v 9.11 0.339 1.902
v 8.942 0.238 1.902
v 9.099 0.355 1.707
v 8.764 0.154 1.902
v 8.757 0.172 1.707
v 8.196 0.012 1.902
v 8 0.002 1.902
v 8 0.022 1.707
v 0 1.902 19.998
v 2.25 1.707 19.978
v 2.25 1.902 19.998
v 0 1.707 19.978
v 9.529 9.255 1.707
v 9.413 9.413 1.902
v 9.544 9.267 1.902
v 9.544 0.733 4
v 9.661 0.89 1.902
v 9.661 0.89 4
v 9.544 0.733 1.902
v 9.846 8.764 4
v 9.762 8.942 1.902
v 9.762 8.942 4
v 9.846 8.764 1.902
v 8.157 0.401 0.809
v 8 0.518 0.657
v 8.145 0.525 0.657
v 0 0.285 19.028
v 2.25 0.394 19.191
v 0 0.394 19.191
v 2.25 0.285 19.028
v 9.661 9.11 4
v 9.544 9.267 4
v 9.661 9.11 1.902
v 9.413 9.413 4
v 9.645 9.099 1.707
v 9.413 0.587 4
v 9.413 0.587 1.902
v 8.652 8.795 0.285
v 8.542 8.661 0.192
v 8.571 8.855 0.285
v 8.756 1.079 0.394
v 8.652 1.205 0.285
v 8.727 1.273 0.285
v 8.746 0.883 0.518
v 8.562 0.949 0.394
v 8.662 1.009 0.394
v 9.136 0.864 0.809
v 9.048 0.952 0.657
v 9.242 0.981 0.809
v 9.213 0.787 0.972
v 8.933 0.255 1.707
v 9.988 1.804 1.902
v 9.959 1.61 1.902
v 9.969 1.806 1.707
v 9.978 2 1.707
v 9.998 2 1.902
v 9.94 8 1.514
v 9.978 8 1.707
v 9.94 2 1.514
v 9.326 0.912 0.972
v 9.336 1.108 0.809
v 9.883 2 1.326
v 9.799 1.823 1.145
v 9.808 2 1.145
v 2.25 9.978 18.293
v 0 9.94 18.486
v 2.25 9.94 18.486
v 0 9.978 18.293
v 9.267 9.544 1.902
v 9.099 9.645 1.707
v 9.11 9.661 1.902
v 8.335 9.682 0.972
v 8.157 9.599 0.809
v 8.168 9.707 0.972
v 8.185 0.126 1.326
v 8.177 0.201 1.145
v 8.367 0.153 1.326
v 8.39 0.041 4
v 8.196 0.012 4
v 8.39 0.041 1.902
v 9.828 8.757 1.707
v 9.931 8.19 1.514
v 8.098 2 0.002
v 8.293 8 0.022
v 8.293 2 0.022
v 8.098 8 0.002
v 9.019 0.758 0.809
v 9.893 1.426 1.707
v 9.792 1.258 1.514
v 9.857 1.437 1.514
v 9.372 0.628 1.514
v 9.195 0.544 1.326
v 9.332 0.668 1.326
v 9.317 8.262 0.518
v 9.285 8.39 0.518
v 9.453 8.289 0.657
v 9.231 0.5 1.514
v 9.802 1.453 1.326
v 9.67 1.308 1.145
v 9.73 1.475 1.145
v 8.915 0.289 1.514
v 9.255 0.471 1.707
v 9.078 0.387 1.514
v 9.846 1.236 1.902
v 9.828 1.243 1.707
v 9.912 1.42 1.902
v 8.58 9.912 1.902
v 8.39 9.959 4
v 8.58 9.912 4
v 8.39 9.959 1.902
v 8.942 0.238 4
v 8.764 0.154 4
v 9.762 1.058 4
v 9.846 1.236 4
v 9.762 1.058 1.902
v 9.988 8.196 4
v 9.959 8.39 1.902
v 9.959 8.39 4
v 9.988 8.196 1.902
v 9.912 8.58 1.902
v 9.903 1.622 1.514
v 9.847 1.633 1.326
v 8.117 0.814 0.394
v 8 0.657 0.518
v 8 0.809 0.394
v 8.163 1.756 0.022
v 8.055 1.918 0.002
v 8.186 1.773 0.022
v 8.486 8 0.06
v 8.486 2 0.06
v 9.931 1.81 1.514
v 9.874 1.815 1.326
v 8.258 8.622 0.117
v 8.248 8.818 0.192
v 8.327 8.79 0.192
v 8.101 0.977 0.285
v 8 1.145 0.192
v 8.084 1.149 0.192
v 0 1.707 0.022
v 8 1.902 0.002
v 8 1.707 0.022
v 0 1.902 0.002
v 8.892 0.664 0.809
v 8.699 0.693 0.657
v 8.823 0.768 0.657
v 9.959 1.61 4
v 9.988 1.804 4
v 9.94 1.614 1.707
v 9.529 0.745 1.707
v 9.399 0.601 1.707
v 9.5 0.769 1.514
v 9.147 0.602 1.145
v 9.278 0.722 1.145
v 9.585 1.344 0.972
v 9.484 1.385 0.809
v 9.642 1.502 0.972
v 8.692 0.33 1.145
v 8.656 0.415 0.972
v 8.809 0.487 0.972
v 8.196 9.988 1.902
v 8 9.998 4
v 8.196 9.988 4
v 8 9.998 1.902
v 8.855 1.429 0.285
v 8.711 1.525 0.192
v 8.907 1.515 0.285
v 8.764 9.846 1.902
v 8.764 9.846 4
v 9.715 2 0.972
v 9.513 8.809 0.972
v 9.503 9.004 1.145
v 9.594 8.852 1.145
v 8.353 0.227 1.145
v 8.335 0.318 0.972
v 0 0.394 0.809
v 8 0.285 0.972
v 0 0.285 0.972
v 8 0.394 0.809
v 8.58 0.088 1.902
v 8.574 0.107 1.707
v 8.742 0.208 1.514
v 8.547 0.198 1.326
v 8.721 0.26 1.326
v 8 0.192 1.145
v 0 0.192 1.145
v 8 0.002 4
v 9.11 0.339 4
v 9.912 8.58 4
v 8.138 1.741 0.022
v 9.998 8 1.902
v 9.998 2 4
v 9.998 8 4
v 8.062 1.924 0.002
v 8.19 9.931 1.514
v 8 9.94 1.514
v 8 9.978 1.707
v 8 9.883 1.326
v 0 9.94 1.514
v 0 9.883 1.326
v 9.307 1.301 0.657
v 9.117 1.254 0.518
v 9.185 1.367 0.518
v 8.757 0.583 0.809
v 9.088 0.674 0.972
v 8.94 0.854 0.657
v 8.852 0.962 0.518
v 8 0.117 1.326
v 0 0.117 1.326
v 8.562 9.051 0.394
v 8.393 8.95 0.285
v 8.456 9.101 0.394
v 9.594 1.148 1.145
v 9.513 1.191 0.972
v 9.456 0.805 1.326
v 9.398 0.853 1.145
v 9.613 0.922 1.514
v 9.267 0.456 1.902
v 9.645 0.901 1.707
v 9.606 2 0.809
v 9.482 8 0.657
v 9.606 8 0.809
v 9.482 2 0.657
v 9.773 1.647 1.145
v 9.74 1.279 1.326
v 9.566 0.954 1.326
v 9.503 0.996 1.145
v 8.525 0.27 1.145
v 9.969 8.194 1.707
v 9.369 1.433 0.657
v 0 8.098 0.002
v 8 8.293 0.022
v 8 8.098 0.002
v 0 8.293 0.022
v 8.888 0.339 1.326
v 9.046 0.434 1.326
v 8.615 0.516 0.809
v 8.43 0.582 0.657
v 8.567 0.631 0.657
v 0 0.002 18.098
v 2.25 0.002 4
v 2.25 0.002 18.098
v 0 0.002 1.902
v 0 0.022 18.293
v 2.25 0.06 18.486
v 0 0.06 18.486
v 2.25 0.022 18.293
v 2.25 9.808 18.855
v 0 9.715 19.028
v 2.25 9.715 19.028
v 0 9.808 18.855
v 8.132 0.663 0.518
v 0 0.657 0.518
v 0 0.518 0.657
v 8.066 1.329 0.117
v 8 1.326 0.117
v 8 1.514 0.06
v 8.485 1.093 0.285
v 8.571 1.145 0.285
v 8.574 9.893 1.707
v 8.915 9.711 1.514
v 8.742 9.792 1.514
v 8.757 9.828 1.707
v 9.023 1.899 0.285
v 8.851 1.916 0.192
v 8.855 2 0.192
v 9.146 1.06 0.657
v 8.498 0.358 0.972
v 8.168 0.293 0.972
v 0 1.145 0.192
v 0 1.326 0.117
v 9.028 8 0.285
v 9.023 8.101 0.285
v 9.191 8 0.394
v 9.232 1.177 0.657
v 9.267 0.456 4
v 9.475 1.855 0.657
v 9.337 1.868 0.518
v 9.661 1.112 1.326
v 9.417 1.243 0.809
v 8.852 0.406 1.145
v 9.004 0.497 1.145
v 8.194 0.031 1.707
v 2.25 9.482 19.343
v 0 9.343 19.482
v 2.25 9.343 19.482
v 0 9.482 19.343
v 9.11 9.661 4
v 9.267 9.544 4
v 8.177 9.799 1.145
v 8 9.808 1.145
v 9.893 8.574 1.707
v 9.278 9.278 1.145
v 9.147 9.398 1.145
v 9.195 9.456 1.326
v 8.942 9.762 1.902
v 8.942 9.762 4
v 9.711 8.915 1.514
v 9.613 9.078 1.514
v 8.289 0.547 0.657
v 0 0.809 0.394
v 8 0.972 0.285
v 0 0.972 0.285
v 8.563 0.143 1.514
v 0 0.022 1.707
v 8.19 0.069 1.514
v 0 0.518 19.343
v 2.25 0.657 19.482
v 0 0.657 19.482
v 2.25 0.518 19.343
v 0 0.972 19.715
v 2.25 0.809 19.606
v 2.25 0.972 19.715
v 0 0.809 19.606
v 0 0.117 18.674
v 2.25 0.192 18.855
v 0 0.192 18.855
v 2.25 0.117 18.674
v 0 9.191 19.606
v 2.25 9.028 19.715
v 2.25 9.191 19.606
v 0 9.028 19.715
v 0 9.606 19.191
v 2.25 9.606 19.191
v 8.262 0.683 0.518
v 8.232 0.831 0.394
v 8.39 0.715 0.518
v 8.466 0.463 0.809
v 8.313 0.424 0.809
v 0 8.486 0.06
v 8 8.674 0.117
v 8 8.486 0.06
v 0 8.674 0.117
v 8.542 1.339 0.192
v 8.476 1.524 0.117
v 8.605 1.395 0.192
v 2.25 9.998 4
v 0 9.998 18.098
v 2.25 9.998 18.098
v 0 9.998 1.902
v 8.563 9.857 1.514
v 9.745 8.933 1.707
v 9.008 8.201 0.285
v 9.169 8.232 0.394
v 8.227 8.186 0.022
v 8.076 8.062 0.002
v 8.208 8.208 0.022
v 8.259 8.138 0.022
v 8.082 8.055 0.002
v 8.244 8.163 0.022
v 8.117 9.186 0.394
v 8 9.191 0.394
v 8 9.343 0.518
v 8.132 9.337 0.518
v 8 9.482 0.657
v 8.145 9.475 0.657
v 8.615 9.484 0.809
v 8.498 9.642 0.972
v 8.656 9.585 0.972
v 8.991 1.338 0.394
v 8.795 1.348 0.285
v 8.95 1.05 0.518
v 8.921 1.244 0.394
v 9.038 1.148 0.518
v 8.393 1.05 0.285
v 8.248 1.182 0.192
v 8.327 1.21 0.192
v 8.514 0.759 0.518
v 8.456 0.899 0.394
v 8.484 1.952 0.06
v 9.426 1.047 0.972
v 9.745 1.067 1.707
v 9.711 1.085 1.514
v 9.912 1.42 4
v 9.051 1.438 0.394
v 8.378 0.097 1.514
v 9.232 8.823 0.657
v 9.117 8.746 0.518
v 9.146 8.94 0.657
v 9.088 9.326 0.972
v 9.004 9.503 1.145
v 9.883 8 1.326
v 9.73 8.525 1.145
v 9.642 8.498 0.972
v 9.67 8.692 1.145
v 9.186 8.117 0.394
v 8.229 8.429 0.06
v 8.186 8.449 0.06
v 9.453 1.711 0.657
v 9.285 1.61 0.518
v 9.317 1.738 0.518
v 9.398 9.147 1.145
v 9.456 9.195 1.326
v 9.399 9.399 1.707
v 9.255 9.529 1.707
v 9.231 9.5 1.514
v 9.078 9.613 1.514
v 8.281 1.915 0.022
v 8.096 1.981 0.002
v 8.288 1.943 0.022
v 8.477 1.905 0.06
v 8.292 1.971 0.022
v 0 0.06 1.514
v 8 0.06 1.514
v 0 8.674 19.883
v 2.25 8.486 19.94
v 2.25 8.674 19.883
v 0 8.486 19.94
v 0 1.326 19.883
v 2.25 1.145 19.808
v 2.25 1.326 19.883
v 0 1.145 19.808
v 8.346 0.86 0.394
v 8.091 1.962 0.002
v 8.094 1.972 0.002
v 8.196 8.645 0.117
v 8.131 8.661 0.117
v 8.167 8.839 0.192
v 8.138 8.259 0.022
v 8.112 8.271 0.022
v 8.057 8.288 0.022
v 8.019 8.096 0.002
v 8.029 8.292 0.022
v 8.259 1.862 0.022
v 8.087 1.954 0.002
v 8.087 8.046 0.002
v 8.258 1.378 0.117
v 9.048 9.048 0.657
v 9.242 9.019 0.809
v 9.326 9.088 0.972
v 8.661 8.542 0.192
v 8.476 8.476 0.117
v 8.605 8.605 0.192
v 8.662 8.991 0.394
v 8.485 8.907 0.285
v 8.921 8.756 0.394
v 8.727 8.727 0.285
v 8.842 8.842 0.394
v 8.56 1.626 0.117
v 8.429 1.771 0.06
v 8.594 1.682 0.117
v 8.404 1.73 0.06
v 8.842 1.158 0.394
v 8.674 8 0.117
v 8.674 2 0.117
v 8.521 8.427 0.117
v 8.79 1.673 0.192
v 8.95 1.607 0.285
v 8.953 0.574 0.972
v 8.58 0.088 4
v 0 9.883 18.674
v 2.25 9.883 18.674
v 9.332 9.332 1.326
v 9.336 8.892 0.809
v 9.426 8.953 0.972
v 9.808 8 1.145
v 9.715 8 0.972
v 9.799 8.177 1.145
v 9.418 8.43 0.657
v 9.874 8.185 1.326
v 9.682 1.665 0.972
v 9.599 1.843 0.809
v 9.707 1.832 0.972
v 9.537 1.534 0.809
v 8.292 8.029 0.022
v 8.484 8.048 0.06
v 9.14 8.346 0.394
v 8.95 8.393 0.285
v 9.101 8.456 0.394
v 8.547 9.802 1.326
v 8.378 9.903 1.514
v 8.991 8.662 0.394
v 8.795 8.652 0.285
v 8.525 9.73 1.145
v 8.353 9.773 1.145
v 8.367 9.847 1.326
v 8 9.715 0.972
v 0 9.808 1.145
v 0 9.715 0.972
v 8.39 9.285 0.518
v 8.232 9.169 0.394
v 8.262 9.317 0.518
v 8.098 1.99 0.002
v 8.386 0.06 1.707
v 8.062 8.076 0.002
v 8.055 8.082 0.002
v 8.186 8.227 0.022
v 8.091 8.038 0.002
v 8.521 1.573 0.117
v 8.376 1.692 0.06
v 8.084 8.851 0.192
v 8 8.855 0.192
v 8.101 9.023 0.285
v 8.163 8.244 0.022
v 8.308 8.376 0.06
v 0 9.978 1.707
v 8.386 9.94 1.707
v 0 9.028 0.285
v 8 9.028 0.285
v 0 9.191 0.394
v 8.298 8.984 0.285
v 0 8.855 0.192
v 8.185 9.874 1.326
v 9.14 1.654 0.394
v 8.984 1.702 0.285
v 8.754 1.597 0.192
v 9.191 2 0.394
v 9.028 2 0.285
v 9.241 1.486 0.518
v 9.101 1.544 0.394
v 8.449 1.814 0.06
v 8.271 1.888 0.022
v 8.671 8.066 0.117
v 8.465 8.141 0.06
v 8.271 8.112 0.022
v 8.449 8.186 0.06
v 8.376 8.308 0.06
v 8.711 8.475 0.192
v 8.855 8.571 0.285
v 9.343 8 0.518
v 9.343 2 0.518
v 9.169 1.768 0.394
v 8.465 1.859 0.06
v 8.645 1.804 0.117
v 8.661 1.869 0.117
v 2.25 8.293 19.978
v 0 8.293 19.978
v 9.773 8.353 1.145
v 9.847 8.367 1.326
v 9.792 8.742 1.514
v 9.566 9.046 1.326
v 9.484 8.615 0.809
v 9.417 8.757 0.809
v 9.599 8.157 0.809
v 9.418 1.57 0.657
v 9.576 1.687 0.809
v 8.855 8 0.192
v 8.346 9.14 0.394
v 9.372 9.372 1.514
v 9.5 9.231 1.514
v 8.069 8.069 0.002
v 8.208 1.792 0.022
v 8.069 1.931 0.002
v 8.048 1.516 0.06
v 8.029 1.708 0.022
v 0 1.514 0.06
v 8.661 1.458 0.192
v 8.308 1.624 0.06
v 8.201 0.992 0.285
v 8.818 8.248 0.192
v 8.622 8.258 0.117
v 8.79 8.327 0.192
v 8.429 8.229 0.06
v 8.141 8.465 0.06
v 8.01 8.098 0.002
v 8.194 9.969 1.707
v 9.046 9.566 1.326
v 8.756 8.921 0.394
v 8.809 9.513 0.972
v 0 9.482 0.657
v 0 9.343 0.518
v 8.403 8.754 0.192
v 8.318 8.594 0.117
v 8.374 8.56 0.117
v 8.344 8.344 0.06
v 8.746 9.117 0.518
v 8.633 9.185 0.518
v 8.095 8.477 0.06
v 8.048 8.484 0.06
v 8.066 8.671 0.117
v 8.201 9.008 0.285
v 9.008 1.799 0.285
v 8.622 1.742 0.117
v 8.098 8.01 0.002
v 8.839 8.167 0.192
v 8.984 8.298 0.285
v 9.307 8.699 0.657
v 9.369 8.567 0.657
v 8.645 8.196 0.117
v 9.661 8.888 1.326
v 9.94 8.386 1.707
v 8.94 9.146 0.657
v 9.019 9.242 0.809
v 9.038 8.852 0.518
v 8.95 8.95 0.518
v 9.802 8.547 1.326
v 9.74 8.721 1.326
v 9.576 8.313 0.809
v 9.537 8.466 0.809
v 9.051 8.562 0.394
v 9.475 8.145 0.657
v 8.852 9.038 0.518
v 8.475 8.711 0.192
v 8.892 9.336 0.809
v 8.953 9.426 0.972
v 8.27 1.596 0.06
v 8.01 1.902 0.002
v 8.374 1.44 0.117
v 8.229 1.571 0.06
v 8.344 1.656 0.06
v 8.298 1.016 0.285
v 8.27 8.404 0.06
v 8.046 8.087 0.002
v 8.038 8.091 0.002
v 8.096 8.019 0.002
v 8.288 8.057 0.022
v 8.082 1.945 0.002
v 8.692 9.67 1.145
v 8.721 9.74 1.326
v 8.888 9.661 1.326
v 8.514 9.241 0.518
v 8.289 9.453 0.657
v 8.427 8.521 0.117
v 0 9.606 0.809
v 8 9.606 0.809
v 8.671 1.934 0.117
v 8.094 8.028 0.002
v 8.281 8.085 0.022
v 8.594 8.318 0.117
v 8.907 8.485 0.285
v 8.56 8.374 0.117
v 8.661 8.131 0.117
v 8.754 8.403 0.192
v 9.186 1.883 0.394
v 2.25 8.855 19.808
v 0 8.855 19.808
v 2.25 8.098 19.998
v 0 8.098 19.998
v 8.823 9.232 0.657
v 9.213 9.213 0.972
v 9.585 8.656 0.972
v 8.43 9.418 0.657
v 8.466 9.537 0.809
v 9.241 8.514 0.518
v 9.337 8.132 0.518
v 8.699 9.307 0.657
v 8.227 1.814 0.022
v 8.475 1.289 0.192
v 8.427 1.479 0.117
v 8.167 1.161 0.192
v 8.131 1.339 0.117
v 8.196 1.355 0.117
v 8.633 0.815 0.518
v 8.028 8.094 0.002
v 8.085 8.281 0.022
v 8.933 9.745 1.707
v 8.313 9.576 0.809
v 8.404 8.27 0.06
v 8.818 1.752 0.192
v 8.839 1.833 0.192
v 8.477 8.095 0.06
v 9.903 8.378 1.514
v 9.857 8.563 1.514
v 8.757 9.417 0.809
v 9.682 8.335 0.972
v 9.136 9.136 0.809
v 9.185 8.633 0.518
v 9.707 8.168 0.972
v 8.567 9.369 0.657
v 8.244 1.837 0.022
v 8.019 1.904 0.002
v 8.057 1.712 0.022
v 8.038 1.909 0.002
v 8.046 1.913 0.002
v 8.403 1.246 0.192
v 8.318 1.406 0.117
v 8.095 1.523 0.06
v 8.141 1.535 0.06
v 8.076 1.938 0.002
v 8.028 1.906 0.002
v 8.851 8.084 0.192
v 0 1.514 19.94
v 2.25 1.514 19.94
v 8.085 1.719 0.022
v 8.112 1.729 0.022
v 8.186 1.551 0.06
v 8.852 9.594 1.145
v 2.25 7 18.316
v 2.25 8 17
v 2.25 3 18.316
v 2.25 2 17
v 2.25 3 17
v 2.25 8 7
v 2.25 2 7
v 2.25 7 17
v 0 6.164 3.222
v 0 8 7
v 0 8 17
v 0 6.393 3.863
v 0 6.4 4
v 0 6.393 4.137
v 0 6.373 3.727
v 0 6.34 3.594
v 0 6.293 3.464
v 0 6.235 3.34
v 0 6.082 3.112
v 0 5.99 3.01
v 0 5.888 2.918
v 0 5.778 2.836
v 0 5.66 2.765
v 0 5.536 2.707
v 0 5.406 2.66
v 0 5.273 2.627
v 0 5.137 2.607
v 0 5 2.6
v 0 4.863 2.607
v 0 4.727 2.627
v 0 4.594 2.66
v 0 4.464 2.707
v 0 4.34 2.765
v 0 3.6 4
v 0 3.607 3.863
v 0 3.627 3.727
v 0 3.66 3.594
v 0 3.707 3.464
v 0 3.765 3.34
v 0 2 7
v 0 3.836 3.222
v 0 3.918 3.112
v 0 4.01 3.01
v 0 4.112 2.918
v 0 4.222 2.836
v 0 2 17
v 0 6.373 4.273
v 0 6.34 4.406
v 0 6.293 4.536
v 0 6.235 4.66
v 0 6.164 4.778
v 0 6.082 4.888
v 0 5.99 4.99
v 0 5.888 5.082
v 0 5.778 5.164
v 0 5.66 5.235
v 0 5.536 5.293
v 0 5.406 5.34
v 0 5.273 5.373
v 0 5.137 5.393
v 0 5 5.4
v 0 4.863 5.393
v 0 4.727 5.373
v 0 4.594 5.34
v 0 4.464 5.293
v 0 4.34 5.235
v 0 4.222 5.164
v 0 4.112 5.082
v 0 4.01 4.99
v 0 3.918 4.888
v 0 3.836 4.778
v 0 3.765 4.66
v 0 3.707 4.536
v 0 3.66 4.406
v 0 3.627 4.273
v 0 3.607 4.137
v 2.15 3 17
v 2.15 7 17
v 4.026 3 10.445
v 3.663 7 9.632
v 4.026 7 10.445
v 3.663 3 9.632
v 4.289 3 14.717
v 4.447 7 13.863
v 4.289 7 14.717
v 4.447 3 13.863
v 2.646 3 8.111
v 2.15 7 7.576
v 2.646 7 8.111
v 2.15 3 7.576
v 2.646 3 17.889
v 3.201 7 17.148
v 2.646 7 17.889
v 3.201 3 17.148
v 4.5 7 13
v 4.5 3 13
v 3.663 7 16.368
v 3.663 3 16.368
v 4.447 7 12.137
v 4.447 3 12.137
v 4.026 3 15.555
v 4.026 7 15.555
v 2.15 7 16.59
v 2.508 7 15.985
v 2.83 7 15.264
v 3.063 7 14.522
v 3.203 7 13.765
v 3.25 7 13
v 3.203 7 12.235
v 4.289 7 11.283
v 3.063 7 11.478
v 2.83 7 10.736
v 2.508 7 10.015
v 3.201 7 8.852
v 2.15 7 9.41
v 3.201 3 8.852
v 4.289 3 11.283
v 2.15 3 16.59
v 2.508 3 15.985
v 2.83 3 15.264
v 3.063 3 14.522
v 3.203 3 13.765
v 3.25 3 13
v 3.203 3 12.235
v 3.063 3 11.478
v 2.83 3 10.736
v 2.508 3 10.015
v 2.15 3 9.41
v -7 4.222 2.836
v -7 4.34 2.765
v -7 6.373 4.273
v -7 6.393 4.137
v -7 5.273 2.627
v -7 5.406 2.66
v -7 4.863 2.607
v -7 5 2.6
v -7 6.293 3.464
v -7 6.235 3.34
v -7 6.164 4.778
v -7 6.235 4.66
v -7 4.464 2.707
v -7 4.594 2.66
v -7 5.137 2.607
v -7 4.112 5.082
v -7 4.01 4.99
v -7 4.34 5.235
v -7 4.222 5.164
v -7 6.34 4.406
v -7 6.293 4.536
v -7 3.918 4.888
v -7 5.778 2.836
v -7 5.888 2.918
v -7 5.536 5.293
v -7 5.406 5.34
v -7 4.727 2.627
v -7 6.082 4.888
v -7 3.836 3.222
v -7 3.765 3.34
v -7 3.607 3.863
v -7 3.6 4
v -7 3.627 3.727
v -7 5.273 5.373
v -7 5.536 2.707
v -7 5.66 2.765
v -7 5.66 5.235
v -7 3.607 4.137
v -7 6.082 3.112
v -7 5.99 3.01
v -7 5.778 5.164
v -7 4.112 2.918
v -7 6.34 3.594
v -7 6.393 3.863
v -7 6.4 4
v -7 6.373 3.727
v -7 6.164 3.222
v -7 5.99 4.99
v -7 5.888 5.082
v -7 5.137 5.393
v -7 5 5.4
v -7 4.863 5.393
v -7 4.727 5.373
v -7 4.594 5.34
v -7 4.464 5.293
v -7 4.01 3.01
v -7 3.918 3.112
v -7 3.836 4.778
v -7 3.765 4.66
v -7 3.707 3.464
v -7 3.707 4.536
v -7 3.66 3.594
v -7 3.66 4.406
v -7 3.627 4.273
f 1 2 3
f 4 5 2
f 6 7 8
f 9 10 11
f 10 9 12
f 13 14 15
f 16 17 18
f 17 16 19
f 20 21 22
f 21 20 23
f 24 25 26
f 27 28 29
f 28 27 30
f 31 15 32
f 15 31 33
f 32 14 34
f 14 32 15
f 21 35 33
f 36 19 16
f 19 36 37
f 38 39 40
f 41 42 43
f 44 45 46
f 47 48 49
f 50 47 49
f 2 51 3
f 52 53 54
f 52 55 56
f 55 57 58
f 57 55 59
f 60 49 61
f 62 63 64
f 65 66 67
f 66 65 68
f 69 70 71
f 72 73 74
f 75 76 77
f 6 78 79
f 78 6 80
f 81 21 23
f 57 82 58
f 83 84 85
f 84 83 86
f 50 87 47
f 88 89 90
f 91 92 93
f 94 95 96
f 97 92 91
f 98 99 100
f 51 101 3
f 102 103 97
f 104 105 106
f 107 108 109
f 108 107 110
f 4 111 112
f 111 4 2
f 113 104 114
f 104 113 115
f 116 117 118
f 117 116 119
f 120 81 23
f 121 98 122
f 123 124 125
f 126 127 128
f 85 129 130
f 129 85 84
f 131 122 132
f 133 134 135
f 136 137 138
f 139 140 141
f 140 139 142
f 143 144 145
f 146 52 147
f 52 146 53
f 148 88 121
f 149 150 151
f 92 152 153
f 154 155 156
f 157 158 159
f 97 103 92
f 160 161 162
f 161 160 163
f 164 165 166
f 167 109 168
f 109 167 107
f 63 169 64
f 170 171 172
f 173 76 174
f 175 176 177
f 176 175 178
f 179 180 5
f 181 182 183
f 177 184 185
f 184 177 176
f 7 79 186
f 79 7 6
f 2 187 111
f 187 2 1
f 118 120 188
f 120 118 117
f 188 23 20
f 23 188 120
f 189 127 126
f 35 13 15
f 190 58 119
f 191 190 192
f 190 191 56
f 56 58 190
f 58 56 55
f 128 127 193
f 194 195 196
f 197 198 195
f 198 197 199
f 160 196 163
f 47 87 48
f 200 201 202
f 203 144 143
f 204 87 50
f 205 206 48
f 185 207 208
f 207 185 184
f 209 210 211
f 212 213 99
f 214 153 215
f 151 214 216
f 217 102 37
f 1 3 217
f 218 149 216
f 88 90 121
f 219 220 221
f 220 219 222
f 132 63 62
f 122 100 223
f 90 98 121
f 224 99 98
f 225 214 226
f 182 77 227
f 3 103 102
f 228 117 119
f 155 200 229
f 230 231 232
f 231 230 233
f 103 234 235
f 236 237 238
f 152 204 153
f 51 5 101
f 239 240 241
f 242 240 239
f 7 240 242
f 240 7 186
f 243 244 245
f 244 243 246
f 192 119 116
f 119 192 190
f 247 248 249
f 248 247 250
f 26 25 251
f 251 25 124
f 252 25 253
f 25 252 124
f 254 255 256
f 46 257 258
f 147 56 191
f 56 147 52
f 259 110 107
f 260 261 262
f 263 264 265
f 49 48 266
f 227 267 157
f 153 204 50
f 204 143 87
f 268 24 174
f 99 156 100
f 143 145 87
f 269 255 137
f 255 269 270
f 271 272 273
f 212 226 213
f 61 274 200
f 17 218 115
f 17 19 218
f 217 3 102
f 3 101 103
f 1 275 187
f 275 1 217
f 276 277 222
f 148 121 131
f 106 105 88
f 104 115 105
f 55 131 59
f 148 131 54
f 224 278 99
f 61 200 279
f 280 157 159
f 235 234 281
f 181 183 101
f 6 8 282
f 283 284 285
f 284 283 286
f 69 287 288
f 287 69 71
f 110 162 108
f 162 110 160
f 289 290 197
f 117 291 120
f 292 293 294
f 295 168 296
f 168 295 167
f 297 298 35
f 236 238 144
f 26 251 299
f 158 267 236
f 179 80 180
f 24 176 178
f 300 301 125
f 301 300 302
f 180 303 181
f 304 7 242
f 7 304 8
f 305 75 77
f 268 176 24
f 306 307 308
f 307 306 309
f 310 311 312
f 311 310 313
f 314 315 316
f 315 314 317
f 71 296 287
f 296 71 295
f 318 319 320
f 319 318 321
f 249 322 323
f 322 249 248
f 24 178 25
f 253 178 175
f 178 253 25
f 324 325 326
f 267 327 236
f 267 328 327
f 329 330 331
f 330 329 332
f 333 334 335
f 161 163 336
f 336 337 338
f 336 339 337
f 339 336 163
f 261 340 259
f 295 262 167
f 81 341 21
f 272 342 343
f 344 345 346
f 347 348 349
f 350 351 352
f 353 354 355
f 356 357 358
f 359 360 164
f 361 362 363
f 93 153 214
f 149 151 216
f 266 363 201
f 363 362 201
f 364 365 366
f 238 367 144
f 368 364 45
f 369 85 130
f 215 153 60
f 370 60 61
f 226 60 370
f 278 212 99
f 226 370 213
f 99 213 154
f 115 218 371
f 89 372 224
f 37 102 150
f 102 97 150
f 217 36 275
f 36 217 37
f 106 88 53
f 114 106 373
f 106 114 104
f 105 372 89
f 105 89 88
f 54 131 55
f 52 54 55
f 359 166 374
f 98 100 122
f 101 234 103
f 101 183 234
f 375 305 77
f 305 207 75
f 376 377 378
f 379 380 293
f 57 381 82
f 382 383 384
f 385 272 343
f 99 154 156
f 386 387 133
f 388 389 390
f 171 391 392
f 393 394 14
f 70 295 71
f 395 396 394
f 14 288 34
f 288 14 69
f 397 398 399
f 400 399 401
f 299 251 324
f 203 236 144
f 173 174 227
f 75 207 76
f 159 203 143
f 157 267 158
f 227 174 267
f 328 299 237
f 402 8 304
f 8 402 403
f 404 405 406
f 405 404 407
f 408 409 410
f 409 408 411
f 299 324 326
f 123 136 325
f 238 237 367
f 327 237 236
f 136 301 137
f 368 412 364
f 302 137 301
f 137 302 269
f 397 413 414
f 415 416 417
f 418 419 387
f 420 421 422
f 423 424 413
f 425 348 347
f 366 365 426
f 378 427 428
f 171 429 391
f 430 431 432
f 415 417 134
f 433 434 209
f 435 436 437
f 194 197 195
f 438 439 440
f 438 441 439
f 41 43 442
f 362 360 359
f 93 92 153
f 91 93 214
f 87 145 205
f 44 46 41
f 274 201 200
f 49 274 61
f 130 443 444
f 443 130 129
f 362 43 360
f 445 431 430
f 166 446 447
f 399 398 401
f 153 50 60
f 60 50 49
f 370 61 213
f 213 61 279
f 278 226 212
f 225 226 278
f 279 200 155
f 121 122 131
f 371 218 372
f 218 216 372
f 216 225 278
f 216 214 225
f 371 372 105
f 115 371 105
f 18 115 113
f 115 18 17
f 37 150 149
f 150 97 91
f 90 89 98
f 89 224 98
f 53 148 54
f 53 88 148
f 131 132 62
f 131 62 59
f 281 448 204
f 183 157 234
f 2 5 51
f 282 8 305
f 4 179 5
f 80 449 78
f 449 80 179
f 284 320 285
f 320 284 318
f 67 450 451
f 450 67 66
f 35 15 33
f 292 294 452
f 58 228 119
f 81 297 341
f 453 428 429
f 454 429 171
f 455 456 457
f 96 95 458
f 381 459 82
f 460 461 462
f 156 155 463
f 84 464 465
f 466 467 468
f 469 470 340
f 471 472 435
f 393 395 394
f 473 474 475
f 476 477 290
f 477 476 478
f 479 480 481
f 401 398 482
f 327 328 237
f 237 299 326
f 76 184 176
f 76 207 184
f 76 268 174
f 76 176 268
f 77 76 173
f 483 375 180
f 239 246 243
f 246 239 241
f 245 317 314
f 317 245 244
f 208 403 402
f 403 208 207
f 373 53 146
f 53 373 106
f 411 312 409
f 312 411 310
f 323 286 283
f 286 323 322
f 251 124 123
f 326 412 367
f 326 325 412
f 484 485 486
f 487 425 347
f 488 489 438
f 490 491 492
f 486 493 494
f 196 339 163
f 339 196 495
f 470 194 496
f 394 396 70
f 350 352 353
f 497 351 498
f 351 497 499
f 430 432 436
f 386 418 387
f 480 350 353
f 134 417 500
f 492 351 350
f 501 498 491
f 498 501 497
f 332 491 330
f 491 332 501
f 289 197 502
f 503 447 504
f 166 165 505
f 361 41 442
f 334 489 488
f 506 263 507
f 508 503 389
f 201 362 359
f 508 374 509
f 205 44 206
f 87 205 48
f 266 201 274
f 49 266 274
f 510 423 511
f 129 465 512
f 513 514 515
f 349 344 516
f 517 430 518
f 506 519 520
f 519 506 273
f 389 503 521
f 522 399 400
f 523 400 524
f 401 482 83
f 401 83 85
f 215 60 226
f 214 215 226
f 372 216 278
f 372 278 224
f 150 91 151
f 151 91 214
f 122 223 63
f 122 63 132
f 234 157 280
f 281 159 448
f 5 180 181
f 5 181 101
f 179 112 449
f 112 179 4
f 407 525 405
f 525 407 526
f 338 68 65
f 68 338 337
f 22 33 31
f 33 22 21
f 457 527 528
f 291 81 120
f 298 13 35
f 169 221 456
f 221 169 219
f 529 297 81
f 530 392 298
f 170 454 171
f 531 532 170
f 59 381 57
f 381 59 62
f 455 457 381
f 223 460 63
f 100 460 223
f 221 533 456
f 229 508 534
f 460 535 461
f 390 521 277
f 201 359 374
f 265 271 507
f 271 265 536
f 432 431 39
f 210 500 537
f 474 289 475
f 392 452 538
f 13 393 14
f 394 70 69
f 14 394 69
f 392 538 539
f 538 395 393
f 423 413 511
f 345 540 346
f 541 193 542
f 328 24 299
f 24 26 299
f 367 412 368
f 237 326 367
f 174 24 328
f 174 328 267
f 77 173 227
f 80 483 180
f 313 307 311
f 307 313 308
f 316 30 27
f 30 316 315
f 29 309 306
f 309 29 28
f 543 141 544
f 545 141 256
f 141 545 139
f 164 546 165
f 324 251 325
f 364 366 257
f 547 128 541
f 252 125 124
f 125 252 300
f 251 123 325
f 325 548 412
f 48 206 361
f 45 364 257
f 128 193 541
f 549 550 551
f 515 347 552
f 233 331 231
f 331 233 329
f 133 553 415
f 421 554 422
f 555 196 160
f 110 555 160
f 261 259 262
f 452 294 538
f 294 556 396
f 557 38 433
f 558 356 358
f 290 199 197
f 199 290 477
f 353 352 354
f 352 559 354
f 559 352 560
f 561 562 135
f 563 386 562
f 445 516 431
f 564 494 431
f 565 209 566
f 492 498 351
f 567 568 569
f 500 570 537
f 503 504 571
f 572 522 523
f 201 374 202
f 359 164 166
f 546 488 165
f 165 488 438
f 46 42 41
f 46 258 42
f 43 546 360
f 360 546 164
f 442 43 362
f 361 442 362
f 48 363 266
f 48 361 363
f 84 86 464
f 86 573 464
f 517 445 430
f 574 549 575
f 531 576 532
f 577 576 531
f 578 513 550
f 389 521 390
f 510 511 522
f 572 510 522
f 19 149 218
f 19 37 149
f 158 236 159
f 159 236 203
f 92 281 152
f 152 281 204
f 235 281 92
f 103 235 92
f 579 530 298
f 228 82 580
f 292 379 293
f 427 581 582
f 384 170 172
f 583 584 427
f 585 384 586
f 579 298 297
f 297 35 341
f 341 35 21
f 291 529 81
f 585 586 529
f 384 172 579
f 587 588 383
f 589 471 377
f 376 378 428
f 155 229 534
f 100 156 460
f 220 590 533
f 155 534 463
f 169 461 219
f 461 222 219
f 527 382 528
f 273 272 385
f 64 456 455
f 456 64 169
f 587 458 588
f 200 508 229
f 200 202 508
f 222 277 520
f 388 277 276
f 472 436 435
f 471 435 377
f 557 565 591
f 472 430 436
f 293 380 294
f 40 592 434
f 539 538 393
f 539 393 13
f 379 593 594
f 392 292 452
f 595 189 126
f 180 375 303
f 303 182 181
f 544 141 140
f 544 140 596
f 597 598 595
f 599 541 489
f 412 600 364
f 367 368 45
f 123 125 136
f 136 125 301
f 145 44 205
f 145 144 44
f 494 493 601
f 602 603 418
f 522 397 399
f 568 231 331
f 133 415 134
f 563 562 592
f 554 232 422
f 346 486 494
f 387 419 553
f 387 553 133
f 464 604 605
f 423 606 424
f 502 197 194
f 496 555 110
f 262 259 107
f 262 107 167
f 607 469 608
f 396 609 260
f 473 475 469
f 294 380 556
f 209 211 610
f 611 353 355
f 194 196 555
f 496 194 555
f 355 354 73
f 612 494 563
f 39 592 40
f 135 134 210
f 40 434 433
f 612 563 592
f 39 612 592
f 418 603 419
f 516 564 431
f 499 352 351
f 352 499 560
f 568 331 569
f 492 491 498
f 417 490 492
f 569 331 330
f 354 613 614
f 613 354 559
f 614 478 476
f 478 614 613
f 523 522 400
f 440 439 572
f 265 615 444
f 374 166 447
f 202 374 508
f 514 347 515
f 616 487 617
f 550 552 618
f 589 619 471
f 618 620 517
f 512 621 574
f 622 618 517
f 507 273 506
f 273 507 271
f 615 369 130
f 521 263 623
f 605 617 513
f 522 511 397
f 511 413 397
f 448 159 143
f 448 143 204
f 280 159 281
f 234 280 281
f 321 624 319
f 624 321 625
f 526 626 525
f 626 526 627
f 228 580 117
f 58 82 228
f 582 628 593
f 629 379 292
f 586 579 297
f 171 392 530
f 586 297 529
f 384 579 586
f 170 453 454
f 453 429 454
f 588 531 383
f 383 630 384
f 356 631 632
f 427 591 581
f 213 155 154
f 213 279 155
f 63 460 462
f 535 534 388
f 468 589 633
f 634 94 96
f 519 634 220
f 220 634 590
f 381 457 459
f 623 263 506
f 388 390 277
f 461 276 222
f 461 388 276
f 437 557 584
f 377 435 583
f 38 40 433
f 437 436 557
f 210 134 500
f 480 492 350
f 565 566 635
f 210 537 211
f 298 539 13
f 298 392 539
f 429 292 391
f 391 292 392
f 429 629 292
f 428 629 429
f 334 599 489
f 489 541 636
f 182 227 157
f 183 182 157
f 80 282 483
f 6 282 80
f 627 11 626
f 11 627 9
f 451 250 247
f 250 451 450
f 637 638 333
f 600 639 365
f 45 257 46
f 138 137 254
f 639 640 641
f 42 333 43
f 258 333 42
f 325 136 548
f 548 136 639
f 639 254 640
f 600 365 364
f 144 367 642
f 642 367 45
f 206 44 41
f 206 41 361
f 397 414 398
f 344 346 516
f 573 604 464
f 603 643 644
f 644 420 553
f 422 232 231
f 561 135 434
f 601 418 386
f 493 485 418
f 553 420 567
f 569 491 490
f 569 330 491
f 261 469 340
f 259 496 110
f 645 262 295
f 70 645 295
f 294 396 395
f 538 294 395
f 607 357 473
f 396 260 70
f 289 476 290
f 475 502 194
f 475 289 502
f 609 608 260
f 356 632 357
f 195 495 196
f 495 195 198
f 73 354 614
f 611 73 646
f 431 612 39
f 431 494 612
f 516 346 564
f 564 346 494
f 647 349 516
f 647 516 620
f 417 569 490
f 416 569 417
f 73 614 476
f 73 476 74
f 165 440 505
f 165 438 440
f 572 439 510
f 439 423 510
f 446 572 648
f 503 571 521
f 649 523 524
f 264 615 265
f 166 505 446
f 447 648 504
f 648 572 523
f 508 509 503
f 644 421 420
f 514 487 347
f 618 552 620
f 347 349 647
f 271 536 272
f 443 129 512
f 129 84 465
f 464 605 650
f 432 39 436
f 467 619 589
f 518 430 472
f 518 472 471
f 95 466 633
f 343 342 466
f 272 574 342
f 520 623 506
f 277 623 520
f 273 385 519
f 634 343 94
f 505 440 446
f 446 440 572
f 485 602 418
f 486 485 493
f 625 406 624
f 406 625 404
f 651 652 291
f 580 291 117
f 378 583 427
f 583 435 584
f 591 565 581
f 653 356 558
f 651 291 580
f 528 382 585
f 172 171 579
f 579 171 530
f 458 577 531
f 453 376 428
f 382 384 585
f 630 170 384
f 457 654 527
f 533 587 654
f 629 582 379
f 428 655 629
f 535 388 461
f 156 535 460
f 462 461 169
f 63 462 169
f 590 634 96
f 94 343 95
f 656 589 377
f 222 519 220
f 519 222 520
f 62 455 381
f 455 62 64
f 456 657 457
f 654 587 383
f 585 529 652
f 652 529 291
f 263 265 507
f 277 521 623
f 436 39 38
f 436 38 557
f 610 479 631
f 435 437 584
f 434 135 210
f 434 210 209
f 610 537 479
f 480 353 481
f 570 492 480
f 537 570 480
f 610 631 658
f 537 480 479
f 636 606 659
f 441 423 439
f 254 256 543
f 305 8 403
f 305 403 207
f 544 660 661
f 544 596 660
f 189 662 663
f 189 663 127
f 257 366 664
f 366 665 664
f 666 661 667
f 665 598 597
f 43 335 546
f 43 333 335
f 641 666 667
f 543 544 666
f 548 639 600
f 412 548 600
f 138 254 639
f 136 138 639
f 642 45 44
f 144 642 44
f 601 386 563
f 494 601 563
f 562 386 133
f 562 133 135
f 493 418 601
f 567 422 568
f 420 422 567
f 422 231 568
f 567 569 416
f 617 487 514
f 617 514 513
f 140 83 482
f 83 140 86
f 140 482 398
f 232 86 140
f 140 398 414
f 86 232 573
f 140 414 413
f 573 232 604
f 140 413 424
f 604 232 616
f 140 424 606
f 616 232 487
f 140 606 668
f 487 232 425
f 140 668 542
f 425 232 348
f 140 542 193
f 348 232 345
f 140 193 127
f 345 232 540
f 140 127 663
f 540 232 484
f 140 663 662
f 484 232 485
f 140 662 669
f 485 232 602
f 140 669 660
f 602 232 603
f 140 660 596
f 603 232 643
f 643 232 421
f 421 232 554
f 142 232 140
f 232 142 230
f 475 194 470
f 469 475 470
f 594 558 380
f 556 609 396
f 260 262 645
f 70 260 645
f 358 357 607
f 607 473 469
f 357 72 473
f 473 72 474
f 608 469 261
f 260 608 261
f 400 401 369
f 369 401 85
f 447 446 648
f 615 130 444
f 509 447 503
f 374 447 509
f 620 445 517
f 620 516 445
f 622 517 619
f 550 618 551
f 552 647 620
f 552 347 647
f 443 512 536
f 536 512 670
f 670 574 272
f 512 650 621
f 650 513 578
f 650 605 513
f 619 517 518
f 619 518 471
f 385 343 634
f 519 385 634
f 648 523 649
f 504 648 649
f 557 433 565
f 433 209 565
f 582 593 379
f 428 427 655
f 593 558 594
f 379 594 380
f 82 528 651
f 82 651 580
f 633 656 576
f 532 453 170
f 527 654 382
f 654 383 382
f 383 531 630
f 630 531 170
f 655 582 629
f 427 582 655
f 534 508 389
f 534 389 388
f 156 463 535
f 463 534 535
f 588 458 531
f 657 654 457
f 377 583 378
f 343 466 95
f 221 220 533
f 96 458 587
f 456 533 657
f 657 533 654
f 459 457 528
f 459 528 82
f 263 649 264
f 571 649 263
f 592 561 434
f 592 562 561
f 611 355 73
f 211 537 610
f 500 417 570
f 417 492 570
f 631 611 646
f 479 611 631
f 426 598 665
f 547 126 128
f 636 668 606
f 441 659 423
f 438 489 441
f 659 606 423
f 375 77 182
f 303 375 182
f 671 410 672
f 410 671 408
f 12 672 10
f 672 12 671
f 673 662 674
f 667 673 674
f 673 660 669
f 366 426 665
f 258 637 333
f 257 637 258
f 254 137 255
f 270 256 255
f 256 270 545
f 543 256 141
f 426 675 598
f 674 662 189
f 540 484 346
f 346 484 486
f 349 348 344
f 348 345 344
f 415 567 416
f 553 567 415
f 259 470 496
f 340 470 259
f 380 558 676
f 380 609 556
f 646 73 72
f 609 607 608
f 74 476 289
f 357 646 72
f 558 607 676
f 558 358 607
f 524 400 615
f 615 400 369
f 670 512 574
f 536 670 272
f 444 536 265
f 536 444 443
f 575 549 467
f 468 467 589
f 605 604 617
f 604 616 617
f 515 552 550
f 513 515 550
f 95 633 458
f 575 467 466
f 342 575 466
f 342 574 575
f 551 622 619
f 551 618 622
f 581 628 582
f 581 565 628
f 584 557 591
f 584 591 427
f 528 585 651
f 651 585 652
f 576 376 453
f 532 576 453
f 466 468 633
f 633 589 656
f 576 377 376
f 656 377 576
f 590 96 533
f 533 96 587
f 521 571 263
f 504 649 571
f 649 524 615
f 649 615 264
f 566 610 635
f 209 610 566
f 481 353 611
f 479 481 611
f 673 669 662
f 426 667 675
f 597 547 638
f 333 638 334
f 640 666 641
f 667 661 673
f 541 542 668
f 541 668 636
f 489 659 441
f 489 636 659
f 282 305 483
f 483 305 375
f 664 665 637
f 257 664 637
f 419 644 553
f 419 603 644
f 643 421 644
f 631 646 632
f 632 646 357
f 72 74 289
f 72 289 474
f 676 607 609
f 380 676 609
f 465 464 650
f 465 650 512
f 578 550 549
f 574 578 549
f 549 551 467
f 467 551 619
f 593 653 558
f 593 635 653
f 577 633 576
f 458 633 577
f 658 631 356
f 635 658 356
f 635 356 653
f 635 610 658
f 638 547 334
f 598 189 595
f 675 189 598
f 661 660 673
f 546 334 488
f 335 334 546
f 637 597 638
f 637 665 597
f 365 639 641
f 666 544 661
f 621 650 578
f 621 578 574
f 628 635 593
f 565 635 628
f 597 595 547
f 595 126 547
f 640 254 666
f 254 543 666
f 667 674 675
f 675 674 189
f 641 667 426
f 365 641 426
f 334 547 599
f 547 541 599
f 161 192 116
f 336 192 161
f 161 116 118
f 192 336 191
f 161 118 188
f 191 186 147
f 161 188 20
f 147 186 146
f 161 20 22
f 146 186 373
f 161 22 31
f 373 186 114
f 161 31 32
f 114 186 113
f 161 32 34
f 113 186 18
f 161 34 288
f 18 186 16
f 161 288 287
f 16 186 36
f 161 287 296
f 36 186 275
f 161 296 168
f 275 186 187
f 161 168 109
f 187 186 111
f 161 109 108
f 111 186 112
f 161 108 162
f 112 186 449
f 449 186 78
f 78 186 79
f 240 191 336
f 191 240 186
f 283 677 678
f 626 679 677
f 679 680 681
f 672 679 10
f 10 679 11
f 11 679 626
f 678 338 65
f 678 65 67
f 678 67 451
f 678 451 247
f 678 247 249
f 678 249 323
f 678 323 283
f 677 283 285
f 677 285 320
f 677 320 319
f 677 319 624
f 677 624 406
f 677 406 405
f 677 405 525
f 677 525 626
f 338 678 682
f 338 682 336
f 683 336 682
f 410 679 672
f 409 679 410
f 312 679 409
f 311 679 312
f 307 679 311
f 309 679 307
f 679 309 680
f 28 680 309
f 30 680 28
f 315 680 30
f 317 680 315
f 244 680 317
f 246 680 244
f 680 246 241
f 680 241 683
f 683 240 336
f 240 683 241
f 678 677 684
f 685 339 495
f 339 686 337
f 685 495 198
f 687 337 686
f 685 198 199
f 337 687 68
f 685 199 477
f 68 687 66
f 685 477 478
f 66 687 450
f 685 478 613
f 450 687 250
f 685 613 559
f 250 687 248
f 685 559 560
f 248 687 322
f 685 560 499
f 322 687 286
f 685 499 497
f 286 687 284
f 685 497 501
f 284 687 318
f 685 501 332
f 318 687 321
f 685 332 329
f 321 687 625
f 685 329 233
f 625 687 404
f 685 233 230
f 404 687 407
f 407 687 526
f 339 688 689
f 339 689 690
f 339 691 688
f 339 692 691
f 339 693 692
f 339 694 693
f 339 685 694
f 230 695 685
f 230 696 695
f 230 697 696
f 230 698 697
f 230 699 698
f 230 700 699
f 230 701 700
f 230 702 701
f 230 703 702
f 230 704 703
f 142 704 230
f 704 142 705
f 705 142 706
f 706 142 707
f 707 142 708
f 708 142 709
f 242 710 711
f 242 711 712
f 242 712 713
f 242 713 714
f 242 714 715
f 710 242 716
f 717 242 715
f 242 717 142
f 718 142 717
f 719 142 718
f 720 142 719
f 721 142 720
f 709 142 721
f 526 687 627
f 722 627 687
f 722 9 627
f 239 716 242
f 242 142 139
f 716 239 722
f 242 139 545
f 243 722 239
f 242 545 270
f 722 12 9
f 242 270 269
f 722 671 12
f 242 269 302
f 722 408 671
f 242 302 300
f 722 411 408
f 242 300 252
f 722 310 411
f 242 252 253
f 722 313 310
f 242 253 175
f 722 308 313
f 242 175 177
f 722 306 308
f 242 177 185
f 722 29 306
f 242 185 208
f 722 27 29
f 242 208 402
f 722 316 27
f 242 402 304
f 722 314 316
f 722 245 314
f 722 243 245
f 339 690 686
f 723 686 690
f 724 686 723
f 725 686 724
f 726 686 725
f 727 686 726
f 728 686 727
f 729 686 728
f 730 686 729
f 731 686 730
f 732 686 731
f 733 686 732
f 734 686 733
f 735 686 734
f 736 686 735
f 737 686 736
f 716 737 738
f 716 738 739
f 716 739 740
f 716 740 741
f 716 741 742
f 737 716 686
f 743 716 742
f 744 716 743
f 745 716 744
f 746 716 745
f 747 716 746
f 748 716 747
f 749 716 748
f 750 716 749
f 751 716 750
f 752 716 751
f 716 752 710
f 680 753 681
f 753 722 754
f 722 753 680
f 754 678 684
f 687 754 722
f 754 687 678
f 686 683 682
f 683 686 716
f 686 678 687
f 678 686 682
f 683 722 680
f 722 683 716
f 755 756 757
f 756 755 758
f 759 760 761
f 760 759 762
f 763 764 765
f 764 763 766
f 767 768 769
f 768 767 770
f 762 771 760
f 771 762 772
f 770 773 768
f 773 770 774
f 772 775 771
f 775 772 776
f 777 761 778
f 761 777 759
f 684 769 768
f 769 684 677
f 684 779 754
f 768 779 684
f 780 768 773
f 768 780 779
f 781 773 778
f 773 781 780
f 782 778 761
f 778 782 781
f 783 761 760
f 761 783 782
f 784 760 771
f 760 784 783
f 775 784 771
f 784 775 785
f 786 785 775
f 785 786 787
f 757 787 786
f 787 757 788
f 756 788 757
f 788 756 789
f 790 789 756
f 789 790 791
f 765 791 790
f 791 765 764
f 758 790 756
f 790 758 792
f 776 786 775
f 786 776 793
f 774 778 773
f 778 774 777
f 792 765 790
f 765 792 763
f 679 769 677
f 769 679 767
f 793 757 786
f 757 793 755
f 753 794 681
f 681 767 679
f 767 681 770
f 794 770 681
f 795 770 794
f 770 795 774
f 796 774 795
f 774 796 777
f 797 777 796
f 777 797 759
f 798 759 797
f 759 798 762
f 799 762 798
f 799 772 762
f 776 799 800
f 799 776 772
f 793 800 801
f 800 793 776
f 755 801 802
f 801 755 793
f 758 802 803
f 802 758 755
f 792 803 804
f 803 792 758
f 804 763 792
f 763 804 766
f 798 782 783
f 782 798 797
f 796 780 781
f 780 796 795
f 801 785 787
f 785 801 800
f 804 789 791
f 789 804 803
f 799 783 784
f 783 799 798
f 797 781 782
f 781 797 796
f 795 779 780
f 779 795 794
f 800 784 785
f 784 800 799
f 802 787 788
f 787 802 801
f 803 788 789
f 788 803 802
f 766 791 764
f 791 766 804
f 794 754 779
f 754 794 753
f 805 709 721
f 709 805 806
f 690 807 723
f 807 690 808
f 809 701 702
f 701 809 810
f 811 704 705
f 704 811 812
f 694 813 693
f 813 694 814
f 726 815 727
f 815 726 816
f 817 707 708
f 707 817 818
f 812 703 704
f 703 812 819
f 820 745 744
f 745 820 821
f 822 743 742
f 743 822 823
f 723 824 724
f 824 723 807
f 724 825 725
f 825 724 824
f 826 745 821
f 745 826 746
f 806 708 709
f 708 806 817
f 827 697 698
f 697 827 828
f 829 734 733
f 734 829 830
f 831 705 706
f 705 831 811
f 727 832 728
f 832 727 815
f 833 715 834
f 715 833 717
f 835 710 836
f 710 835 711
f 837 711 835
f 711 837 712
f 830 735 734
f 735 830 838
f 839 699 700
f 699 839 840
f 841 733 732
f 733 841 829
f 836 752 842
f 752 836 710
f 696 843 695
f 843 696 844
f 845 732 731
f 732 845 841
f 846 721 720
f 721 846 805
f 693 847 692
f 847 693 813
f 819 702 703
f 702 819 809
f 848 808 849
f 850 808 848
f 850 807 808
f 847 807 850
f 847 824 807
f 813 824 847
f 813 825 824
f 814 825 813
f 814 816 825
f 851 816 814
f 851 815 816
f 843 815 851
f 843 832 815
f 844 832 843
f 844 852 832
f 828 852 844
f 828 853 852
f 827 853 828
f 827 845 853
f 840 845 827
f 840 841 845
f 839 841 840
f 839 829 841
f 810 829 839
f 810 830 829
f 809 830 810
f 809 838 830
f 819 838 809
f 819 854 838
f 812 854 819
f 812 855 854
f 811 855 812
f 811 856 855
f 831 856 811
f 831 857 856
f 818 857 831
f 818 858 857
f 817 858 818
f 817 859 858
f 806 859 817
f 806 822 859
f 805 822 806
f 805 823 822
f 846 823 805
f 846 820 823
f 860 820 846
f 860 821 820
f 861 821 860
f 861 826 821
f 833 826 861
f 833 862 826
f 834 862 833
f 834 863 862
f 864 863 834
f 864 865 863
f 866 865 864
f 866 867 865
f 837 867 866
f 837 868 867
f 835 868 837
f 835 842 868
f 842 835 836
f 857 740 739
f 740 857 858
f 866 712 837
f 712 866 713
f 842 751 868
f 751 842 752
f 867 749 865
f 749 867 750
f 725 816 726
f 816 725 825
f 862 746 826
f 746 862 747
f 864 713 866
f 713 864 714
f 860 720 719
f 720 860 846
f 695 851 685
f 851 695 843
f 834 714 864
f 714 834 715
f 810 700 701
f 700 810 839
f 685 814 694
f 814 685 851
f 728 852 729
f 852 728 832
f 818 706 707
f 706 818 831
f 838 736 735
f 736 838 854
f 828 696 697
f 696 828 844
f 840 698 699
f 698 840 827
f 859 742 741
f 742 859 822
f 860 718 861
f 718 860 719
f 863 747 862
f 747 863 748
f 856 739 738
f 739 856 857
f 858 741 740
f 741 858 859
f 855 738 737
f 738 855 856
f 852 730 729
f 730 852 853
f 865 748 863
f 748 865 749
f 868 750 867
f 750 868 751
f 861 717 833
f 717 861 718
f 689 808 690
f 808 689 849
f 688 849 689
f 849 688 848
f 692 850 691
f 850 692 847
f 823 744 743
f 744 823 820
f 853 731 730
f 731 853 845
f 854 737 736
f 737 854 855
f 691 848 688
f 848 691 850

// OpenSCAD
// Träger/Halter für Glasregalboden in Badschrank

$fn=64;

pin_thickness = 3;

holder_wall_height = 20;
holder_wall_width = 10;
holder_wall_thickness = 2.25;

holder_L_thickness = 4;
holder_L_length = 10;

spring_cutout_width = holder_wall_width - 4;
spring_cutout_height = 10;
spring_cutout_pos_h_offset = 7; 

mink_radius = 2;

pin_diameter = 2.8;
pin_length = 7;

spring_width = 4;
spring_radius = 11;
spring_thickness = 1.25;
spring_height = 2.25;
spring_offset = 8;

delta = .1;

union() {
    // main body
    difference() {
        // base shape
        translate(mink_radius*[0,1,1])
        minkowski() {
            cube([holder_L_length-mink_radius,
                  holder_wall_width-2*mink_radius, 
                  holder_wall_height-2*mink_radius
                  ]);
            sphere(mink_radius);
        }
        
        // main cut-out
        translate([holder_wall_thickness, 0, holder_L_thickness])
            scale([holder_L_length, holder_wall_width, holder_wall_height])
            cube(1);
        
        // straight back
        translate([-mink_radius, 0, 0])
            scale([mink_radius, holder_wall_width, holder_wall_height])
            cube(1);
        
        // spring cutout
        translate([-delta, (holder_wall_width-spring_cutout_width)/2, spring_cutout_pos_h_offset])
            scale([holder_wall_thickness+2*delta, spring_cutout_width, spring_cutout_height])
            cube(1);
    };
    
    // pin
    translate([-pin_length/2, holder_wall_width/2, holder_L_thickness])
        rotate([0,90,0])
        cylinder(h=pin_length, d=pin_diameter, center=true);
    
    // spring
    intersection() {
        translate([holder_wall_thickness-spring_radius+spring_height,holder_wall_width/2,spring_cutout_height/2+spring_offset])
            scale([1,1,.8])
            rotate([90,0,0])
            difference() {
                cylinder(h=spring_width, r=spring_radius, center=true);
                cylinder(h=spring_width+2*delta, r=spring_radius-spring_thickness, center=true);
            }
        translate([holder_wall_thickness-delta, 0, spring_cutout_pos_h_offset])
        cube([holder_L_length,
              holder_wall_width, 
              holder_wall_height
              ]);  
    }
}
